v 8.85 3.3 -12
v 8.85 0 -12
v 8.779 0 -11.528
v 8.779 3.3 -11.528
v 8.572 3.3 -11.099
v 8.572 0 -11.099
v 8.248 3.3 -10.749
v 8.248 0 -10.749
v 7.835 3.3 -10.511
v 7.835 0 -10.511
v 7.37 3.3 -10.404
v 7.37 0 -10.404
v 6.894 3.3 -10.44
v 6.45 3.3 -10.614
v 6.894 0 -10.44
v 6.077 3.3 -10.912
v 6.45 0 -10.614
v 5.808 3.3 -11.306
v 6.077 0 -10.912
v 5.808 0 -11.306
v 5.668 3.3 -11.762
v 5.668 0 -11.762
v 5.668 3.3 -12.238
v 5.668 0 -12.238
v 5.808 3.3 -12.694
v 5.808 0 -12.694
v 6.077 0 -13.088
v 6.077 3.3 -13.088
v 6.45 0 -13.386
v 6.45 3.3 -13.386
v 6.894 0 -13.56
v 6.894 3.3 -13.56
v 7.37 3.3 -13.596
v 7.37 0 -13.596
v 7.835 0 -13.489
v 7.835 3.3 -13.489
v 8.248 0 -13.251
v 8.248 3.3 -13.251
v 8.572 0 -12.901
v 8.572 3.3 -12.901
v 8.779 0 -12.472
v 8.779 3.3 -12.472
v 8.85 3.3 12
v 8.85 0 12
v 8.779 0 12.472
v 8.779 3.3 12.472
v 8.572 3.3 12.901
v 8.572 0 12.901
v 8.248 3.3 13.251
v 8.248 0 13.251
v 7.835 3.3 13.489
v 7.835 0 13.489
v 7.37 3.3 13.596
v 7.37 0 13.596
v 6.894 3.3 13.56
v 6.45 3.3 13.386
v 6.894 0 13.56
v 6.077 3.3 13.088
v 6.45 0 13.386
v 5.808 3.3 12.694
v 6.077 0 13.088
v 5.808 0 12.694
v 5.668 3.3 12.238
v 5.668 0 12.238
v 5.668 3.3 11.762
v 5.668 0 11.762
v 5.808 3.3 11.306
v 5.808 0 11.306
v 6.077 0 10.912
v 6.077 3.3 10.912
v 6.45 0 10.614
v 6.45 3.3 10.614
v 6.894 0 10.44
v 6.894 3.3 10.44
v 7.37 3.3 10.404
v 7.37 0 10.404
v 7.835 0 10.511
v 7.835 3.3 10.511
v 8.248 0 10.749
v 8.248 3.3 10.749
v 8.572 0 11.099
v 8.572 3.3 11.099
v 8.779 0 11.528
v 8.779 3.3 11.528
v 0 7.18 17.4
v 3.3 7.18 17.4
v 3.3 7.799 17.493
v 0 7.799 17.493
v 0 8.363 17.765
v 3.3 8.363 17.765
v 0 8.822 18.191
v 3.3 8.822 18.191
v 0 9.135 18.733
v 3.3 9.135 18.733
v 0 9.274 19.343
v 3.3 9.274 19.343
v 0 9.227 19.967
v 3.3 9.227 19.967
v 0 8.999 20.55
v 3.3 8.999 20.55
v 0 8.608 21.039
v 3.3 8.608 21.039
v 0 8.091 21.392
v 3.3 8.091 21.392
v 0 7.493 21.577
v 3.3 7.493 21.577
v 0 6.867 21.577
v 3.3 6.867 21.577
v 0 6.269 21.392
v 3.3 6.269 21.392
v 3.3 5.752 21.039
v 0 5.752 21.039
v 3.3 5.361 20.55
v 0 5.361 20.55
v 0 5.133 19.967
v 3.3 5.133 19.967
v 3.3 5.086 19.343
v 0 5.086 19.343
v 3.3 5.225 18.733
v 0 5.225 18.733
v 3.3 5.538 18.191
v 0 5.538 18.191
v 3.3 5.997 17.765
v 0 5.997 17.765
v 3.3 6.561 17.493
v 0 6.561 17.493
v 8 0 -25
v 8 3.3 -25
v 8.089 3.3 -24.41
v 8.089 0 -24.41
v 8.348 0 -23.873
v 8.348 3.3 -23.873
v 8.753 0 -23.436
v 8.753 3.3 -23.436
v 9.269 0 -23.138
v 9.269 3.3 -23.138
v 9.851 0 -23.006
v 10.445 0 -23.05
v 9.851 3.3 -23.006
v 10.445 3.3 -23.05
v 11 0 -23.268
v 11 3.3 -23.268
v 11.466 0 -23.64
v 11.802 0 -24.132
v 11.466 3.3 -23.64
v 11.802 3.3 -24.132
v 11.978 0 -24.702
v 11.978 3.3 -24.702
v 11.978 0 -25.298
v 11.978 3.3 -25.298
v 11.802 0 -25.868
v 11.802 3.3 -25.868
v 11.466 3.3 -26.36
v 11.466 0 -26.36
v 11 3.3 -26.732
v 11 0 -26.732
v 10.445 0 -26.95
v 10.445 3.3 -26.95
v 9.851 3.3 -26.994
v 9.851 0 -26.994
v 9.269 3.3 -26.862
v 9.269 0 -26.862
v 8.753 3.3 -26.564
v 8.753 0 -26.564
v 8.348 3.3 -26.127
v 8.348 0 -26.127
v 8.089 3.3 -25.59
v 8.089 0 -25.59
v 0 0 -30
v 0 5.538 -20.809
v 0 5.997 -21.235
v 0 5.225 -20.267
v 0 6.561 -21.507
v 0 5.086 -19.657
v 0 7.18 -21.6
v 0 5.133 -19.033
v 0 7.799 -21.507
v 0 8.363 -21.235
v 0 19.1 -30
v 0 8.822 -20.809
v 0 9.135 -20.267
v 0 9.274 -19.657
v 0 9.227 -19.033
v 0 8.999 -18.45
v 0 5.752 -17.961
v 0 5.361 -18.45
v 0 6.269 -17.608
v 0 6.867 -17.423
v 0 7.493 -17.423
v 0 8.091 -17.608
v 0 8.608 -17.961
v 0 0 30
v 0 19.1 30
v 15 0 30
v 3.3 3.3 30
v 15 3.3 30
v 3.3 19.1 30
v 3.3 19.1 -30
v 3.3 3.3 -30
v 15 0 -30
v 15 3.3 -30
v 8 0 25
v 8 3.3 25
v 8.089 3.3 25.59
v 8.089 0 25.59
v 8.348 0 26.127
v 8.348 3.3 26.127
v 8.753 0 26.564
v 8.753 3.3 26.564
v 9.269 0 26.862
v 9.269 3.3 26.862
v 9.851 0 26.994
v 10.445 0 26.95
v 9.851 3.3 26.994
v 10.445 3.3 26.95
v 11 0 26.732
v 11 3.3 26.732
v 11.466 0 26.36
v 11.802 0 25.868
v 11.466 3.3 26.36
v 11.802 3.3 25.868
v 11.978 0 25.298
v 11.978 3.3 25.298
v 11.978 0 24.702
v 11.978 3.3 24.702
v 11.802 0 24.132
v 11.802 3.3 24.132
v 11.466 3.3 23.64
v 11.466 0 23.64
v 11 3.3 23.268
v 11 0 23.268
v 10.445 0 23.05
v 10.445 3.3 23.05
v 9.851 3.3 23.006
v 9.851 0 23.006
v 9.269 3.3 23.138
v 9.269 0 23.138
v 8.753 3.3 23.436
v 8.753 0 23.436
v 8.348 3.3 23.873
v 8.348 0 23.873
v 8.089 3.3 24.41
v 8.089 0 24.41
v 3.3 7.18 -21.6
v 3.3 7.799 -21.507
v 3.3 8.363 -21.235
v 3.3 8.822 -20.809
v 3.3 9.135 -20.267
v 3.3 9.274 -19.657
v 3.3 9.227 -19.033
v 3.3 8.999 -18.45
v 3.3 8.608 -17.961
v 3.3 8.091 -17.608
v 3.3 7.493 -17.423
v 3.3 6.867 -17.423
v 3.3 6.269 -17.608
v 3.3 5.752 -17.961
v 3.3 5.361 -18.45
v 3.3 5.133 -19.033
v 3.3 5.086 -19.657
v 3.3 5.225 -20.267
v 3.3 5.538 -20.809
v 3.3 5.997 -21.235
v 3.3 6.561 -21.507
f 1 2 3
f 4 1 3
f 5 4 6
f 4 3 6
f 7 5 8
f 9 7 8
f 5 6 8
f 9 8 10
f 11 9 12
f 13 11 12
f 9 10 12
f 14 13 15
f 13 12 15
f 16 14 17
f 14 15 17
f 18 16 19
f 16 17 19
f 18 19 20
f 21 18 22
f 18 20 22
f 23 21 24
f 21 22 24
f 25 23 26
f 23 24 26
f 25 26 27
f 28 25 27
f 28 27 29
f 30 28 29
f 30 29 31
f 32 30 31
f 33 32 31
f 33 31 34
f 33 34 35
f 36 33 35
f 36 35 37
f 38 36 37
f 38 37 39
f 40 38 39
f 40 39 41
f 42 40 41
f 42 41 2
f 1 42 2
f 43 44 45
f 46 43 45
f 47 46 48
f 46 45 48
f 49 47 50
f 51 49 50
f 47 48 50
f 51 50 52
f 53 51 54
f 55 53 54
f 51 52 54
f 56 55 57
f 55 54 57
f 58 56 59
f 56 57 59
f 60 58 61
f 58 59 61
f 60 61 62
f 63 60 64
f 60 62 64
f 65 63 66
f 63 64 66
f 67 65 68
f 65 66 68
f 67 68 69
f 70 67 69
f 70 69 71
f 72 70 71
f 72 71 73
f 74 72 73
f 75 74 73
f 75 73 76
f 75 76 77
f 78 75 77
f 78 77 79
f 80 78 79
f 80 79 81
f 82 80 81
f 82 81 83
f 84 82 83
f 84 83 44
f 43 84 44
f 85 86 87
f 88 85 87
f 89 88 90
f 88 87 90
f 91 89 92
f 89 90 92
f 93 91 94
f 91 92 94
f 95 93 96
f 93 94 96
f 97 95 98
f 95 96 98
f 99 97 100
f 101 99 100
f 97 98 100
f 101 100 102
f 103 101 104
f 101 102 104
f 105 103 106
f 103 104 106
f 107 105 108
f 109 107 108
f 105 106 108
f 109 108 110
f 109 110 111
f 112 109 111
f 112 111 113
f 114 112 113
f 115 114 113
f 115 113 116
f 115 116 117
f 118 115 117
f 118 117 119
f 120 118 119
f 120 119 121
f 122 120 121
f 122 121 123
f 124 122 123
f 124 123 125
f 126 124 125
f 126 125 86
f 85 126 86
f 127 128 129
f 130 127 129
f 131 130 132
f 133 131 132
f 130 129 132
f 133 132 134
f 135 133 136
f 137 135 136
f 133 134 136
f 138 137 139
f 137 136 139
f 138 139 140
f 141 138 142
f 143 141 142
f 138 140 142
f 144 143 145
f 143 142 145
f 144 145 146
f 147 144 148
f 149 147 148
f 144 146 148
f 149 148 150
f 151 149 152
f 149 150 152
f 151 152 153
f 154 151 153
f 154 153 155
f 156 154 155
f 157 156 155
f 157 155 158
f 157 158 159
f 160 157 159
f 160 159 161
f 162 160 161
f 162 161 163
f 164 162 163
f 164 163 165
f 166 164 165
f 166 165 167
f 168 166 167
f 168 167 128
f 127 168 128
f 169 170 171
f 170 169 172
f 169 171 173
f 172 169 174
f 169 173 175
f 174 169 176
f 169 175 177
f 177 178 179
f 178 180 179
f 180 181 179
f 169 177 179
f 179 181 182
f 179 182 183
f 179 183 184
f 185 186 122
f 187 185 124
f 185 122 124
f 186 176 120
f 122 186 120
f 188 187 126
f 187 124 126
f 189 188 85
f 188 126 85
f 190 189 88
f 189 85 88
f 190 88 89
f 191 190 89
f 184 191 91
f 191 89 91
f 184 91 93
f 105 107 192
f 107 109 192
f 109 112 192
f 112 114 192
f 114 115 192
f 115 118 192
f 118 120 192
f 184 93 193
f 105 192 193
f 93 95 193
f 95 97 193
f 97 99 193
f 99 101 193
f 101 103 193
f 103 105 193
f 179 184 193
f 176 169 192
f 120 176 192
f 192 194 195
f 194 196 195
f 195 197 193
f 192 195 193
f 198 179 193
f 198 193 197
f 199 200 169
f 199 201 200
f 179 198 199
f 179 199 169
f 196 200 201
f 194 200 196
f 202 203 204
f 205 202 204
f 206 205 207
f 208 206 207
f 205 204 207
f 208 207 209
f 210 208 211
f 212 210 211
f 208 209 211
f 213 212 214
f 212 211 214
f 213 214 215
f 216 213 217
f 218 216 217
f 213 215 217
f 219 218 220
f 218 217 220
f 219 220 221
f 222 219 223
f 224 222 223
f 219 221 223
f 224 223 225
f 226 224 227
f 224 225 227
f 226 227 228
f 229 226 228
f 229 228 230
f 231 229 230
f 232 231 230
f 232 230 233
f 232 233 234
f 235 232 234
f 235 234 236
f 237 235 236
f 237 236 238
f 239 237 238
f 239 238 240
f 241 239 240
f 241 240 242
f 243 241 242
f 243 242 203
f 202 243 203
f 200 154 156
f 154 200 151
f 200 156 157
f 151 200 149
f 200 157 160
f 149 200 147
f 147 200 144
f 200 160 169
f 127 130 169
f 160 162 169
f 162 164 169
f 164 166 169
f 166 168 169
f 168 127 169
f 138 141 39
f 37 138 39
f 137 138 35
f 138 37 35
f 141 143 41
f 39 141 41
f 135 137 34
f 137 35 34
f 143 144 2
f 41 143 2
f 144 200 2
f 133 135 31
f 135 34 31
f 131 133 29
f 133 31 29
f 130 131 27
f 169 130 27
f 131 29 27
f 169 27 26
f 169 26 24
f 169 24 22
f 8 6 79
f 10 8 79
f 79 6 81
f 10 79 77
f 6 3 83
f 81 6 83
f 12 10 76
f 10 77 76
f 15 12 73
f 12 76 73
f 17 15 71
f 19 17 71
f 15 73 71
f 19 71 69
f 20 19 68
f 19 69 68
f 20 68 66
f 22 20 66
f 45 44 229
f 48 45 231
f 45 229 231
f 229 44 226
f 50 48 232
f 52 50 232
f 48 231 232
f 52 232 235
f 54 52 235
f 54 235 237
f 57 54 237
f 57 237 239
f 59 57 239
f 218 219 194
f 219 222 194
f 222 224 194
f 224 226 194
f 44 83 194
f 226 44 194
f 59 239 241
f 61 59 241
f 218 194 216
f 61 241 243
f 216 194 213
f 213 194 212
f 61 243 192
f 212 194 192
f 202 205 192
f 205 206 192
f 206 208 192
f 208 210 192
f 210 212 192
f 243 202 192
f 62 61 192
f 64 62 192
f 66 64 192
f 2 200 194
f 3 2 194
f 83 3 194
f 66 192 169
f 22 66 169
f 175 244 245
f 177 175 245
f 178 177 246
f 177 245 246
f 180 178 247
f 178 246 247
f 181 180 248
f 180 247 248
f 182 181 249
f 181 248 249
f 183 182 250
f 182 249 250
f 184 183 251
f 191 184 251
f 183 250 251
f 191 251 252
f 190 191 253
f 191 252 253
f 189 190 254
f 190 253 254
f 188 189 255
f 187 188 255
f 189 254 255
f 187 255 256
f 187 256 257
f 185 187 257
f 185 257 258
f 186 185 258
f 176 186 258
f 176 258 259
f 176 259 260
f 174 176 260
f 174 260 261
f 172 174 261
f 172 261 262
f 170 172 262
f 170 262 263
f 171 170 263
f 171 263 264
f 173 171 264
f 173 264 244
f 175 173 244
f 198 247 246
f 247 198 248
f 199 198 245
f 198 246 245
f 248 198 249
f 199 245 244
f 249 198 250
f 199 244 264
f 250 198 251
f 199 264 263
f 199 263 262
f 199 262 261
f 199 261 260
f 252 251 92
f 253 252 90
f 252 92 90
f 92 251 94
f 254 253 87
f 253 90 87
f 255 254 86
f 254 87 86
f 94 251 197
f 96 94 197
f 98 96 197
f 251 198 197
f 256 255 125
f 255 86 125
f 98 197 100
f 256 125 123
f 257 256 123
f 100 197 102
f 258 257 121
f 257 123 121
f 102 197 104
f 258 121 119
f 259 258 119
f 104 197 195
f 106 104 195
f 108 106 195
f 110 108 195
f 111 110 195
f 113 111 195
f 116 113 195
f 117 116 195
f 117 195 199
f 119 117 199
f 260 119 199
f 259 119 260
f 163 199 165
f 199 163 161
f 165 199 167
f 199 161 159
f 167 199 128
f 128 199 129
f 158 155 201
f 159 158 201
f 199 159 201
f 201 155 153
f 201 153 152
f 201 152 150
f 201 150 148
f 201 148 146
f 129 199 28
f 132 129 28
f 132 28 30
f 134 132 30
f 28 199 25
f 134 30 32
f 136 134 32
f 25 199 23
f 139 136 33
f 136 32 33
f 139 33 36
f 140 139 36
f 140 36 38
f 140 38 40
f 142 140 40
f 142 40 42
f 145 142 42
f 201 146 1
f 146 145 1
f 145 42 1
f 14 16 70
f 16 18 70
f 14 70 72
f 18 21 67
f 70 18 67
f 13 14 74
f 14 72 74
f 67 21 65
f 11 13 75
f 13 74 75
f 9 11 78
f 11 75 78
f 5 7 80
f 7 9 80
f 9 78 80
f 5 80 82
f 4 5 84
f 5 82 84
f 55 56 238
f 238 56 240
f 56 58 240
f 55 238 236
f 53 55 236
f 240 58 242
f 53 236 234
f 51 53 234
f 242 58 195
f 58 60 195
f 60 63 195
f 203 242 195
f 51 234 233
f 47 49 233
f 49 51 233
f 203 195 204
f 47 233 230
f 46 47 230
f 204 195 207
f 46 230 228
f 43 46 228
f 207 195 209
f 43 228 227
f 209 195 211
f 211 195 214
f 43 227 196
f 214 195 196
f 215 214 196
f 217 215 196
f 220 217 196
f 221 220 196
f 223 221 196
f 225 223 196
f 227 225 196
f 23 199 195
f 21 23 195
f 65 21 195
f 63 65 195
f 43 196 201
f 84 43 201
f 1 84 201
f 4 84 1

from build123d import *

# Parameters (mm, degrees)
EXTRUDE1_DEPTH               = 30
SKETCH2_W                    = 4.1
SKETCH2_H                    = 60
CUT_FOR_WALKER_CHASSIS_DEPTH = 20.1
F_4_2_4_2_DIAMETER_HOLE1_D   = 4.2
M4X0_7_TAPPED_HOLE1_D        = 4
M4X0_7_TAPPED_HOLE1_DEPTH    = 3.3
SKETCH7_R                    = 1.6
CUT_EXTRUDE1_DEPTH           = 20.1


with BuildPart() as part:
    # Sketch1 → Extrude1 (new body, symmetric)
    with BuildSketch(Plane.XY):
        Polygon((0, 0), (0, 19.1), (3.3, 19.1), (3.3, 3.3), (19.1, 3.3), (19.1, 0), align=None)
    extrude(amount=EXTRUDE1_DEPTH, both=True)

    # Sketch2 → Cut for walker chassis (cut, through all)
    with BuildSketch(Plane.XZ):
        with Locations((17.05, 0)):
            Rectangle(SKETCH2_W, SKETCH2_H)
    extrude(amount=-CUT_FOR_WALKER_CHASSIS_DEPTH, mode=Mode.SUBTRACT)

    # Ø4.2 (4.2) Diameter Hole1 (through all)
    with Locations(Plane.ZY):
        with Locations((-19.5, 7.18), (19.5, 7.18)):
            Hole(F_4_2_4_2_DIAMETER_HOLE1_D / 2)

    # M4x0.7 Tapped Hole1
    with Locations(Plane.XZ):
        with Locations((10, 25), (10, -25)):
            Hole(M4X0_7_TAPPED_HOLE1_D / 2, depth=M4X0_7_TAPPED_HOLE1_DEPTH)

    # Sketch7 → Cut-Extrude1 (cut, through all)
    with BuildSketch(Plane.XZ):
        with Locations((7.25, -12)):
            Circle(SKETCH7_R)
        with Locations((7.25, 12)):
            Circle(SKETCH7_R)
    extrude(amount=-CUT_EXTRUDE1_DEPTH, mode=Mode.SUBTRACT)


solid = part.part
